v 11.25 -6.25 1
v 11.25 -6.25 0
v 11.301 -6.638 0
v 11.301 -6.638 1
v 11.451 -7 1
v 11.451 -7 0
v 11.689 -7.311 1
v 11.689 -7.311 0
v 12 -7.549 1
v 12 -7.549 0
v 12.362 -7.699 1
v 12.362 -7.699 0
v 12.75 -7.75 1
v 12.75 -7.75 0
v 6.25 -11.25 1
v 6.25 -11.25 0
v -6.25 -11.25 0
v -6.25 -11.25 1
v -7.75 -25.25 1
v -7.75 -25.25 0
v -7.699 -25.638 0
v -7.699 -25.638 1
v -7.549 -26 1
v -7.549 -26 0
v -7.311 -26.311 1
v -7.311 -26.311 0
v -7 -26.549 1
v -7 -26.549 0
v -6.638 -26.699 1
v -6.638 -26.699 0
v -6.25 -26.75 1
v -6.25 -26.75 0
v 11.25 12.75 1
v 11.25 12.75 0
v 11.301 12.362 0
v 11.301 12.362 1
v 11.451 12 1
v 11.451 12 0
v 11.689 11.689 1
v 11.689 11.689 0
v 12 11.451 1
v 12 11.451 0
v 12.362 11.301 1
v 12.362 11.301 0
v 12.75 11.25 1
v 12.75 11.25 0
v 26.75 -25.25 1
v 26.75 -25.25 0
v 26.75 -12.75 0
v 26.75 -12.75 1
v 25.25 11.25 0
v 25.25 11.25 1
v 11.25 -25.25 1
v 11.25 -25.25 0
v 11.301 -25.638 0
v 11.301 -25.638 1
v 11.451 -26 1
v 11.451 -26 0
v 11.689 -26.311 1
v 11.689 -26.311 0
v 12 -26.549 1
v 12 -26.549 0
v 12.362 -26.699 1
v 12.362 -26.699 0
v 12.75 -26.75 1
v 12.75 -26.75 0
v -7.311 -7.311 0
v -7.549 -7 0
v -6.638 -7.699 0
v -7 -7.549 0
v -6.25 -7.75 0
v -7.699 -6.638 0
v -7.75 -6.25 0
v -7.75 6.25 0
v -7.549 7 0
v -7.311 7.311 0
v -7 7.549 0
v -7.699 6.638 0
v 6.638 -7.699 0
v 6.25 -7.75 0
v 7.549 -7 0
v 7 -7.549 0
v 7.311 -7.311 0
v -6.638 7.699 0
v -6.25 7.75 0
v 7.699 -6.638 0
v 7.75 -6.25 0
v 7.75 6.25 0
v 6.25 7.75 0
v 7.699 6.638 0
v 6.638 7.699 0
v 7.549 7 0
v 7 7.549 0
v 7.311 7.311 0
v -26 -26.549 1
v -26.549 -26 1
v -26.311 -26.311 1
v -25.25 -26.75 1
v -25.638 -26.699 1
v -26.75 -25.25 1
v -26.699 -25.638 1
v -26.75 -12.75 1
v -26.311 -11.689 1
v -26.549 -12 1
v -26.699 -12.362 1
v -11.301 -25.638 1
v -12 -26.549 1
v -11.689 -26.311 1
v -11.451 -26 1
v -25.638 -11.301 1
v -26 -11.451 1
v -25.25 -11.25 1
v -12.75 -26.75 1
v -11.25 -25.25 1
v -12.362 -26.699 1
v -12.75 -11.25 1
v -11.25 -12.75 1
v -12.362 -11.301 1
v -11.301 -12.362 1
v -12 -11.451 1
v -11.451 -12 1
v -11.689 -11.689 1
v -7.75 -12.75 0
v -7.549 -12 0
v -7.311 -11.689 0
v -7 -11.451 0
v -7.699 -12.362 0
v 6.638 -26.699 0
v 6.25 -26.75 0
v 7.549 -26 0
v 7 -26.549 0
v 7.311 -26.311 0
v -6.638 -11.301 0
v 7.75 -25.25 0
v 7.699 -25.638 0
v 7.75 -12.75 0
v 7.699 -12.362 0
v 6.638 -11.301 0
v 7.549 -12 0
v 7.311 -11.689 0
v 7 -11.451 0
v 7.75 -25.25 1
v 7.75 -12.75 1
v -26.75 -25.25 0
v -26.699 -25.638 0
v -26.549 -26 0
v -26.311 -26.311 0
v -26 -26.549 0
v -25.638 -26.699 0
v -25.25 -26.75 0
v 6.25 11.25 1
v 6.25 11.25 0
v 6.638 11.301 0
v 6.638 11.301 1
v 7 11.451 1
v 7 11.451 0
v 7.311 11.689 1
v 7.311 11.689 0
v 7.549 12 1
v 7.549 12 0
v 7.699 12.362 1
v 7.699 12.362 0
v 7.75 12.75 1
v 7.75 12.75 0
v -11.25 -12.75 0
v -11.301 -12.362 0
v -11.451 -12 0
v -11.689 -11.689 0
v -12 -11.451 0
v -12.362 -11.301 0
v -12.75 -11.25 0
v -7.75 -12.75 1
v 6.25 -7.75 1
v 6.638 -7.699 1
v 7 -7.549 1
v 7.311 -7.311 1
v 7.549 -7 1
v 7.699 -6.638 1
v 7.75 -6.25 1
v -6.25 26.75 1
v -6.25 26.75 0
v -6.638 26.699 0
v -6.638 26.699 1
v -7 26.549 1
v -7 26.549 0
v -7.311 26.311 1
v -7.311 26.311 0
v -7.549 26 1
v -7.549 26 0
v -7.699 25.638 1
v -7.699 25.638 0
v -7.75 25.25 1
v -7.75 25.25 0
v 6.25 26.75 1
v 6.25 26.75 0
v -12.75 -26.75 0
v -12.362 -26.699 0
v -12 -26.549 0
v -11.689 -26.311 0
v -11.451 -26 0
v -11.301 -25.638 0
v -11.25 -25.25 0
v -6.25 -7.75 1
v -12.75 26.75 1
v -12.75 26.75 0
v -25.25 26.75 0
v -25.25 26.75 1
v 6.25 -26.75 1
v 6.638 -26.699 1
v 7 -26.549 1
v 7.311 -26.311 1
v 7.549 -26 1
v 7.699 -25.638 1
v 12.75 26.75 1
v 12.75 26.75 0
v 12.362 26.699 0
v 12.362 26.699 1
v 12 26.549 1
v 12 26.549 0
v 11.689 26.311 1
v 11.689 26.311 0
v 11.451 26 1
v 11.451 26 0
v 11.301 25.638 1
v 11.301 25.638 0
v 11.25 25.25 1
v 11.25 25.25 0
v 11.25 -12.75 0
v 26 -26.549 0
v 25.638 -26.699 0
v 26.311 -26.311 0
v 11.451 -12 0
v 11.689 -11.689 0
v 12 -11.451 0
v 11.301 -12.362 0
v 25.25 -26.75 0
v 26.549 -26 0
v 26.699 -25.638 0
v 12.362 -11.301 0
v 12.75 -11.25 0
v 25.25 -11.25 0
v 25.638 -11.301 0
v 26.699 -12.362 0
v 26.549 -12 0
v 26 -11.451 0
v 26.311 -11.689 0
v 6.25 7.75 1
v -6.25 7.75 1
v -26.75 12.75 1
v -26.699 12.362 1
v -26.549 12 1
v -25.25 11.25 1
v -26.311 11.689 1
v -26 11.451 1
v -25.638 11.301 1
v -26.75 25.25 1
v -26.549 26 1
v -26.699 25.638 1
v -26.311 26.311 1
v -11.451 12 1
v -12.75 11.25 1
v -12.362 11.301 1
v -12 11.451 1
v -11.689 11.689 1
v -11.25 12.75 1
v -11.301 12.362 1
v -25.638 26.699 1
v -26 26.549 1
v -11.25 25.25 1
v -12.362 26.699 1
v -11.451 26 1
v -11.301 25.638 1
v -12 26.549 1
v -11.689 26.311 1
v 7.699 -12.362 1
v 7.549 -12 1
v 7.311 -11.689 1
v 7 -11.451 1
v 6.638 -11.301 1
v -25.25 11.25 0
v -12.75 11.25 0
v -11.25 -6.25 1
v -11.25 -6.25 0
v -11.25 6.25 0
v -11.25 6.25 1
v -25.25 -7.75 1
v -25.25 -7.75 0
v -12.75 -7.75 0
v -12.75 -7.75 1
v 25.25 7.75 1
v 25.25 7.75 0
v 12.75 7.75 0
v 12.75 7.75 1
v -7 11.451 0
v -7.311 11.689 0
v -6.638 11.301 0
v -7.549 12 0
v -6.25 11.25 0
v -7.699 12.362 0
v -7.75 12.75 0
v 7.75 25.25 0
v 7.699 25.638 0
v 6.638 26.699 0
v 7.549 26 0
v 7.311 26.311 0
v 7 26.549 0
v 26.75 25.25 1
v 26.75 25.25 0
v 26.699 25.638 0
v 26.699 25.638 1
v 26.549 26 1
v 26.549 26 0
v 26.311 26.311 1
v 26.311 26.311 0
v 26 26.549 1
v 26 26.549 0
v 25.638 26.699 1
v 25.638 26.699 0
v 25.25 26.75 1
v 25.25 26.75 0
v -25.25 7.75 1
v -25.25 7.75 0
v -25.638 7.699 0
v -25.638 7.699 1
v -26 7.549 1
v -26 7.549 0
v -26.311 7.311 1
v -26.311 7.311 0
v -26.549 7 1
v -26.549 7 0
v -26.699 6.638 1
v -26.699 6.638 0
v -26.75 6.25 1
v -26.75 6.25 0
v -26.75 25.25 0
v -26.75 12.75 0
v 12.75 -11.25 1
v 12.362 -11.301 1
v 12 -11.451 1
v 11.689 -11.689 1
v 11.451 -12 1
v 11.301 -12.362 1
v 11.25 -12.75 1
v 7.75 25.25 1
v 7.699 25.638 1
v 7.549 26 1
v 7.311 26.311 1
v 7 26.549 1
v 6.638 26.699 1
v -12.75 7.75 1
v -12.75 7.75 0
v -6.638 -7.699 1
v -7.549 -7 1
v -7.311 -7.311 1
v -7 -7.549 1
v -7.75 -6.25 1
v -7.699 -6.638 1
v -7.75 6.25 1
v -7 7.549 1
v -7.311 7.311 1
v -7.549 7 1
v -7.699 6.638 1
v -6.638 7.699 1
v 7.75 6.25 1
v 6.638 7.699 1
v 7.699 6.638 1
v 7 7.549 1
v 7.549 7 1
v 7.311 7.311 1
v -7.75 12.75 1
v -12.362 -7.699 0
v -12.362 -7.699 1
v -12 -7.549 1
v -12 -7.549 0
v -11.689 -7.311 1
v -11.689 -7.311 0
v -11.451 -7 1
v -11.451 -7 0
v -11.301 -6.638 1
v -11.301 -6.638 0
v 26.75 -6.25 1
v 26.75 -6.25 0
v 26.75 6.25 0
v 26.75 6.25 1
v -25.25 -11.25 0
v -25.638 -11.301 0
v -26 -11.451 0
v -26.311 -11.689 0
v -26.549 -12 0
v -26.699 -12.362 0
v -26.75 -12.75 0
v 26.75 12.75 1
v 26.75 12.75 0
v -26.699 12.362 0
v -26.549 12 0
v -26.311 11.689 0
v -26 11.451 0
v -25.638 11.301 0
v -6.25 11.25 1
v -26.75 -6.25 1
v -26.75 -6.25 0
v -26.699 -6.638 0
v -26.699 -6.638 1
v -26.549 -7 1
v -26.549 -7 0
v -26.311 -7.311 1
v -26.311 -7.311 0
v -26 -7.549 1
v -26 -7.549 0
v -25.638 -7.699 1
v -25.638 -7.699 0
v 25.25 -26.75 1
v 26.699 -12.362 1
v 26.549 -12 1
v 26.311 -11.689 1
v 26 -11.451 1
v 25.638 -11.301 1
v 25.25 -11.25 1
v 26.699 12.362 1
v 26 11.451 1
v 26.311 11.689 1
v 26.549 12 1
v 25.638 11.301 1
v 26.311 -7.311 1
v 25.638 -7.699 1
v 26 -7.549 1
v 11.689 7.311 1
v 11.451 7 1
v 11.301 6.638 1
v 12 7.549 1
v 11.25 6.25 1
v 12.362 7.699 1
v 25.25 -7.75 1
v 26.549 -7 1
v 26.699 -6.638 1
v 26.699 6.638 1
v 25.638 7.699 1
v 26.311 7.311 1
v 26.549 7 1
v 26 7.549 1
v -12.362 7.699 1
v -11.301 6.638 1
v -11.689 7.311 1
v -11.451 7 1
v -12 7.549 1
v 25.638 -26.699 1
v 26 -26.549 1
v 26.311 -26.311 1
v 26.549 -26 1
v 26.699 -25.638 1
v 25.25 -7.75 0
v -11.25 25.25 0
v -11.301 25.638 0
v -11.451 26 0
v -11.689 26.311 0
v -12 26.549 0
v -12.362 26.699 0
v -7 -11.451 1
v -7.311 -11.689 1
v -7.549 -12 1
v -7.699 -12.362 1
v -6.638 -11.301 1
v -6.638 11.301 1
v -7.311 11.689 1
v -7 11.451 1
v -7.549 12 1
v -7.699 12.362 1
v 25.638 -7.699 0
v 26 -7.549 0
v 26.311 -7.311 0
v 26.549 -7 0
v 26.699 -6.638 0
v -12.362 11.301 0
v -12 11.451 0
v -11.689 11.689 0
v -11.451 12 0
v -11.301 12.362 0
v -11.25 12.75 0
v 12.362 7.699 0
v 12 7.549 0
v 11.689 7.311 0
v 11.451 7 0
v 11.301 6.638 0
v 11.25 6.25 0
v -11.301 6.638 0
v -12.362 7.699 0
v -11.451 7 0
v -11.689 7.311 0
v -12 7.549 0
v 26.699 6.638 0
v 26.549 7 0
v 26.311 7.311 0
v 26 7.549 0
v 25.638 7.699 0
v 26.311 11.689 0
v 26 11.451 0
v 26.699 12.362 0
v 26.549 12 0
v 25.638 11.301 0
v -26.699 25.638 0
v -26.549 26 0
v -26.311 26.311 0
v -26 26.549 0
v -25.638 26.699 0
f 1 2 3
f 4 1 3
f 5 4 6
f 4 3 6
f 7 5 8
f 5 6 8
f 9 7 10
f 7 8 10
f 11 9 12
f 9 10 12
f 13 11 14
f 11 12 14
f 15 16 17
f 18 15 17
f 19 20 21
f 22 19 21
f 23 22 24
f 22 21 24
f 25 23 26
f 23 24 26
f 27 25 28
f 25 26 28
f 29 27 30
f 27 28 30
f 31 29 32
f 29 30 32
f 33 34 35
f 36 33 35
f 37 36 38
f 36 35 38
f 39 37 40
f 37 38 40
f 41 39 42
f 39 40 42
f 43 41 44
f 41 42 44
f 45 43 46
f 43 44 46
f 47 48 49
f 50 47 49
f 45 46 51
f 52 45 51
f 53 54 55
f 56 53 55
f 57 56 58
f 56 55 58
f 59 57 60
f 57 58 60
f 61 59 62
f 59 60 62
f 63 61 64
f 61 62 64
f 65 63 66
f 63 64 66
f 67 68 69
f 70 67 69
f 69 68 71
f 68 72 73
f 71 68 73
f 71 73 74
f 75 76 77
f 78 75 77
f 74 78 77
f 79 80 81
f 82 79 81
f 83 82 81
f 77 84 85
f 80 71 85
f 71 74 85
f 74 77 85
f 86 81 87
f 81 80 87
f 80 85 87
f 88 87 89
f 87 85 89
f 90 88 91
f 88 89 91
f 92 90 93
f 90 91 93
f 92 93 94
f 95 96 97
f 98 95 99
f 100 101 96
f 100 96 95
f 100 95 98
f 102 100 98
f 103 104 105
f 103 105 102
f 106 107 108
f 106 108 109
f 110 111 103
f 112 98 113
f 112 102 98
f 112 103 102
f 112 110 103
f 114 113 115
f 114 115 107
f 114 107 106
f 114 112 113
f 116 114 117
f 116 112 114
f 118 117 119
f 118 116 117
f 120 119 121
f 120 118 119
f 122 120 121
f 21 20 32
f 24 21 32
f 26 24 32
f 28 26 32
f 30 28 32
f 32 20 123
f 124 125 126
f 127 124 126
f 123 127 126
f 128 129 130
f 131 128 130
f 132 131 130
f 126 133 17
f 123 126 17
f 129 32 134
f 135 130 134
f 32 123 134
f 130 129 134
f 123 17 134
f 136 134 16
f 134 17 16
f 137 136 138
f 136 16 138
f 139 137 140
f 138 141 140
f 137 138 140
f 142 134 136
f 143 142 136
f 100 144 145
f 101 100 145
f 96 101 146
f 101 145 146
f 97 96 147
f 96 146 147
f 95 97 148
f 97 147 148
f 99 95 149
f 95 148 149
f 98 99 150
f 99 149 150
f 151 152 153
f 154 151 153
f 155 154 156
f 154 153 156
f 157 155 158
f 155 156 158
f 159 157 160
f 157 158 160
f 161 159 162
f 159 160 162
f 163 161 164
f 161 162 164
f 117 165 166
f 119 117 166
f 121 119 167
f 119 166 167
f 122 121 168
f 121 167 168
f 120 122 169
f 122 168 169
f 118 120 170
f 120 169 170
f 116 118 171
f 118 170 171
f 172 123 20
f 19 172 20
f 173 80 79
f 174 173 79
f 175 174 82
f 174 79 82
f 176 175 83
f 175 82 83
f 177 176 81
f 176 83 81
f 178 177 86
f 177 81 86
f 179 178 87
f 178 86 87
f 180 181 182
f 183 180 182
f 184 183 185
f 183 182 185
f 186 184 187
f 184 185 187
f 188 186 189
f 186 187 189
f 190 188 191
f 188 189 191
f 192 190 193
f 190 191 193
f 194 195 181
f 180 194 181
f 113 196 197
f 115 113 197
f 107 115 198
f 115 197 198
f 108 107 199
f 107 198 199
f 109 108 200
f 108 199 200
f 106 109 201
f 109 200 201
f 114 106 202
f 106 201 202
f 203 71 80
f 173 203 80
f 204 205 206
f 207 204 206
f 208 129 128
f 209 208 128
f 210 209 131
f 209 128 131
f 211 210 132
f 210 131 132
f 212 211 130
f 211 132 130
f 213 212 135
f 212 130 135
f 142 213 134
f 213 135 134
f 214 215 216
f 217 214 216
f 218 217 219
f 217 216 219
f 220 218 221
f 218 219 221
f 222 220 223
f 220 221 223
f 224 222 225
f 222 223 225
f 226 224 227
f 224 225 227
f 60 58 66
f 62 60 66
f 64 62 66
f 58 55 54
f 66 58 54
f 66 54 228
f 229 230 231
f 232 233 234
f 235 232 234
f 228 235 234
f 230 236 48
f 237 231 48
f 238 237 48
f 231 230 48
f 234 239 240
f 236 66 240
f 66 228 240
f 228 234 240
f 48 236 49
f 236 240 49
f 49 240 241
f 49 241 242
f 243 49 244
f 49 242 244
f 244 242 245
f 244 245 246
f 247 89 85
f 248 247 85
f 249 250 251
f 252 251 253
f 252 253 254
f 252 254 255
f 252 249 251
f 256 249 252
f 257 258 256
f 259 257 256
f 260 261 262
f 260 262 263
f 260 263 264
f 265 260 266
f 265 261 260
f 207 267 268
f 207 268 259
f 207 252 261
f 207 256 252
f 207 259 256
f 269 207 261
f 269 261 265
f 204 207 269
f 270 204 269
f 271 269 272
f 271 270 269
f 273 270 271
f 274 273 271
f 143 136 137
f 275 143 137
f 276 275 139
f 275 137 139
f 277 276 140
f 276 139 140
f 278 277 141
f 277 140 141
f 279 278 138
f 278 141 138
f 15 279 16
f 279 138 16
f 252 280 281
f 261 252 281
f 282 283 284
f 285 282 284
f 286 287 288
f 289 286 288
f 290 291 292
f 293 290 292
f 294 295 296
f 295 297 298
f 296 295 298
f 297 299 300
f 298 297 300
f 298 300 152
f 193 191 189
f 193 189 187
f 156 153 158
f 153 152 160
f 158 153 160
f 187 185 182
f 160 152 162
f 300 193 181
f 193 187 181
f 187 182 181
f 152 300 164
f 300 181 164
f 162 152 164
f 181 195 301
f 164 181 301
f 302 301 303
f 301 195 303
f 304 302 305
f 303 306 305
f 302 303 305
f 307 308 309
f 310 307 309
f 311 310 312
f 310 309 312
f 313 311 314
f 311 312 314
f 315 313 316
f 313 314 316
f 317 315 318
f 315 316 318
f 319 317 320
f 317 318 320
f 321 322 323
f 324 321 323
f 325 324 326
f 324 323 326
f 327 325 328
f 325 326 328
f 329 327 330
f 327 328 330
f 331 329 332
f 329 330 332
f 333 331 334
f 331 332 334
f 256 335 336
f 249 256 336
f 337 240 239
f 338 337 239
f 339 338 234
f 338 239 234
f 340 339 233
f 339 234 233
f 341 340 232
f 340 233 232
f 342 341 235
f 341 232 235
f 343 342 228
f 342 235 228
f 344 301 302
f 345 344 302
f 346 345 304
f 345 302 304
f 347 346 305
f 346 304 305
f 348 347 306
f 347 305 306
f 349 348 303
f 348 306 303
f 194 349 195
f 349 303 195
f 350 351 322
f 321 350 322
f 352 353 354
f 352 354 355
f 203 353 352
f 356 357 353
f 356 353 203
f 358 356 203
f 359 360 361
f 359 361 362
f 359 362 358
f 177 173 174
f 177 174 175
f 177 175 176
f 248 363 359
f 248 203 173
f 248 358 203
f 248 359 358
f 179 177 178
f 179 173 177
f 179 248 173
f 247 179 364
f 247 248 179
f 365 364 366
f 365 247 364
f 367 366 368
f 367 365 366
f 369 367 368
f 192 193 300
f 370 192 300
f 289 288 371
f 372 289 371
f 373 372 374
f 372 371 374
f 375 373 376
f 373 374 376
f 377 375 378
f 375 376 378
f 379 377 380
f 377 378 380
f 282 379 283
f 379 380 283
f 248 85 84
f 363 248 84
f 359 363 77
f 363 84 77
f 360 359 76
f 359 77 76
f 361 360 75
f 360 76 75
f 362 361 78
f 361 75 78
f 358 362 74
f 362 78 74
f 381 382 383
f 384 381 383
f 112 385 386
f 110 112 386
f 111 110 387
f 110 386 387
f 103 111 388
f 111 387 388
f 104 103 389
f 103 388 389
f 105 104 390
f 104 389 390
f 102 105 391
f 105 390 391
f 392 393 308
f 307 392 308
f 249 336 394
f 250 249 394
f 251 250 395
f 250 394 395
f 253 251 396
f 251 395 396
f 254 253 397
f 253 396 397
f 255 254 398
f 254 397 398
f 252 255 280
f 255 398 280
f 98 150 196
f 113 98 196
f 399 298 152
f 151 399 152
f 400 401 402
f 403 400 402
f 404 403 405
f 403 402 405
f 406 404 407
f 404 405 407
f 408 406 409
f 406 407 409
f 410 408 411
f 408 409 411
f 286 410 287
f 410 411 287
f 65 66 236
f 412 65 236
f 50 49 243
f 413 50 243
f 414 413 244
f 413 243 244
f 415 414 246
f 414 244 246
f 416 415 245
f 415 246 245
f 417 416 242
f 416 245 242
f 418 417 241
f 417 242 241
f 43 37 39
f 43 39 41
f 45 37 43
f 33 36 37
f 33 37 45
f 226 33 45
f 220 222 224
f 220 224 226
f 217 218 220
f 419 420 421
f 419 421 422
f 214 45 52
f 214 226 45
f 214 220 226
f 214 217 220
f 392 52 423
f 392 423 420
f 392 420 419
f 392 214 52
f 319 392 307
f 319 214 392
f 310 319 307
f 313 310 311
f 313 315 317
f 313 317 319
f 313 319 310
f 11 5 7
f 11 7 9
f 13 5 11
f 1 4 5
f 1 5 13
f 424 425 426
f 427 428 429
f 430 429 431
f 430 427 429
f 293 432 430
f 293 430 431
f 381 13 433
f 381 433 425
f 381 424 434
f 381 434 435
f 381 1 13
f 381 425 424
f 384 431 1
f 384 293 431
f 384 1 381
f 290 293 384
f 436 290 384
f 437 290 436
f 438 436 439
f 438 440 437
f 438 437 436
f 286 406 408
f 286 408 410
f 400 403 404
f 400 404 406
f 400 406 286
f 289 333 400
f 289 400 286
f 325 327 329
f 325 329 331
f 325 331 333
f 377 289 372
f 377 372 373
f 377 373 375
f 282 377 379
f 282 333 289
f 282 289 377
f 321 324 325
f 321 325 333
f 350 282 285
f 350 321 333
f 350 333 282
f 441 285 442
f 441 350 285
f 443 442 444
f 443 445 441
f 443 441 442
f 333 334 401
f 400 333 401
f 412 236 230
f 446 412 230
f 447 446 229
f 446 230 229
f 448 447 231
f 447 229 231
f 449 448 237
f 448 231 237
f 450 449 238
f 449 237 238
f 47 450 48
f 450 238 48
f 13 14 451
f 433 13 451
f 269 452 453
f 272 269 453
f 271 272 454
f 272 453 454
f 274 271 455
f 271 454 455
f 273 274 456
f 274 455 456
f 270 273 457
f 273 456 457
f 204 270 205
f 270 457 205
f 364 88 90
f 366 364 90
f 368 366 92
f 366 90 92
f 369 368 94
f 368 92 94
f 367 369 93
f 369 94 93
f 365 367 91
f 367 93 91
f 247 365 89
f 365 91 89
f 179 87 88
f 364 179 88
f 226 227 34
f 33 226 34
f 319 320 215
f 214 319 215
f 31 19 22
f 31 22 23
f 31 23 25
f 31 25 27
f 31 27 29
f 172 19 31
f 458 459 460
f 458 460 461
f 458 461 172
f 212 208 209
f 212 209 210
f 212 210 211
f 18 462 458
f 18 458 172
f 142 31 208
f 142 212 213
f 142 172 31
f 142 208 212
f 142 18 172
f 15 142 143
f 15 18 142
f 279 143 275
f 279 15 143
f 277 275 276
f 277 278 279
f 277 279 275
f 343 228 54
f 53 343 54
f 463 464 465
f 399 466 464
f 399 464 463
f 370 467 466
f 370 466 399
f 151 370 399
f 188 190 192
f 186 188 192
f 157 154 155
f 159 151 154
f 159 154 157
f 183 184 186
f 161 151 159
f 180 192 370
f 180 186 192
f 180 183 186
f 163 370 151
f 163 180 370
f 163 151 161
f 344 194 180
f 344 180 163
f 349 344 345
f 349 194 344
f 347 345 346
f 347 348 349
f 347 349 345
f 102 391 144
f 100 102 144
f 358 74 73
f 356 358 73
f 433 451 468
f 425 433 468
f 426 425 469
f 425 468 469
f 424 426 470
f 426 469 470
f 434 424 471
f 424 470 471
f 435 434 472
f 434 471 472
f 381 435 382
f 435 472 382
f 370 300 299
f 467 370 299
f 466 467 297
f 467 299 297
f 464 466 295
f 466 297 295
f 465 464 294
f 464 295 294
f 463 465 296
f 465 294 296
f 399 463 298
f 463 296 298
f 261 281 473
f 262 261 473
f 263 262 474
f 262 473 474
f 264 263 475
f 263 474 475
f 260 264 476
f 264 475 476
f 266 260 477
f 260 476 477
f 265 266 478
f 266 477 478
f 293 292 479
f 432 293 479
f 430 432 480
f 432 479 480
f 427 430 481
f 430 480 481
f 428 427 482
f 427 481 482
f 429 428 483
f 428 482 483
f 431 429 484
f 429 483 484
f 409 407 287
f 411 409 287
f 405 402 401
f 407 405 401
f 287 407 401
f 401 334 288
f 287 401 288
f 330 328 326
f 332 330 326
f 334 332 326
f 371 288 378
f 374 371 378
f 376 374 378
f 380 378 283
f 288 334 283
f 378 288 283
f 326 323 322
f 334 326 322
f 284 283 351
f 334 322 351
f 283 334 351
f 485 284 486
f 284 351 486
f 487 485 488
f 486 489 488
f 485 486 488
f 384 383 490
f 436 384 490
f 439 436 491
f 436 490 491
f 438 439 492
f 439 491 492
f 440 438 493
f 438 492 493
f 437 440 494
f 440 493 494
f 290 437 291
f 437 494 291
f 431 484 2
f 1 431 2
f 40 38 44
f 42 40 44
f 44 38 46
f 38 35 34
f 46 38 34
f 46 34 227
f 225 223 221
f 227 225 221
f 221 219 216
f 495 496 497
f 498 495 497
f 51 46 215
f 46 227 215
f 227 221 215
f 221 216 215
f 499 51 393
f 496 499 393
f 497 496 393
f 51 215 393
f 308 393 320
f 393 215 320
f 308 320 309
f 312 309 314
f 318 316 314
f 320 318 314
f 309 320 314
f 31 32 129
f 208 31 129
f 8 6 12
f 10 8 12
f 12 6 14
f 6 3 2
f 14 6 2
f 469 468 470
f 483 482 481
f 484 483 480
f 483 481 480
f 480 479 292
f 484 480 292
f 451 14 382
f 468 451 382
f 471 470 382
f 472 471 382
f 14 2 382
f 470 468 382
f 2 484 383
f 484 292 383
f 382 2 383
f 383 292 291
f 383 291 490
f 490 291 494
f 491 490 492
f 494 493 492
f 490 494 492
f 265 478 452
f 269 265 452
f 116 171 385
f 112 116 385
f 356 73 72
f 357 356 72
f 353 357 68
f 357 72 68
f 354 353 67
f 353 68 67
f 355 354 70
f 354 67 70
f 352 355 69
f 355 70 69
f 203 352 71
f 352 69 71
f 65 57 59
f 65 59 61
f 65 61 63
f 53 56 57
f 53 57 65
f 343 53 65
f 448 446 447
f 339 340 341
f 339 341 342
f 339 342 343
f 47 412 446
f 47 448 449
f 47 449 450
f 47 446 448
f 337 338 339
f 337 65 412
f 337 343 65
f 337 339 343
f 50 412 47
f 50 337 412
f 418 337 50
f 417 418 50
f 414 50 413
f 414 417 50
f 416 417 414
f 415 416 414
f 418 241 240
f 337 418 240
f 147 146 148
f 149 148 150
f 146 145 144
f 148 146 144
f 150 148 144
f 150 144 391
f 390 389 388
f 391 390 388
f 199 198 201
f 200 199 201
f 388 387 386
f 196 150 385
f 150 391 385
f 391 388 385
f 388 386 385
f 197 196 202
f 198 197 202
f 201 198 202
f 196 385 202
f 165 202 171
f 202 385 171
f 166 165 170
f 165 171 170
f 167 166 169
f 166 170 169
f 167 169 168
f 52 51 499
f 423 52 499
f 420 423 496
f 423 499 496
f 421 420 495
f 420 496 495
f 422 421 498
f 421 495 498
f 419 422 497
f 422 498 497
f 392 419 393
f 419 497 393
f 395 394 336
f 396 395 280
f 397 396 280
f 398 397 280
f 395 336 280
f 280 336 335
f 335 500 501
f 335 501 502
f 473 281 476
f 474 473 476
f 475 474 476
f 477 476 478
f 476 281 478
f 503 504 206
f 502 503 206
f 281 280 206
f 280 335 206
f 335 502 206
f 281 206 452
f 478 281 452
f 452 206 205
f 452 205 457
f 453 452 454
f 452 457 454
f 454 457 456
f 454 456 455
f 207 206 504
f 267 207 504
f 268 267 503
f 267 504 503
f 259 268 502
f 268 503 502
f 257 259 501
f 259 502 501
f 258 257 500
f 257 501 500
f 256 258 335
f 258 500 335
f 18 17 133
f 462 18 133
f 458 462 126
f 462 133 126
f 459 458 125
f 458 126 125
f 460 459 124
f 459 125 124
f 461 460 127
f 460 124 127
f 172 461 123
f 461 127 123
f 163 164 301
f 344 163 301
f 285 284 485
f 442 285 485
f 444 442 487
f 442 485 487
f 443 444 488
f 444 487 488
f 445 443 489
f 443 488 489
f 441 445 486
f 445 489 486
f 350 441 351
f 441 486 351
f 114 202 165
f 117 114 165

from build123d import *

# Parameters (mm, degrees)
F1_DEPTH = 1


with BuildPart() as f1:
    # F0 (on Top) → F1 (new body)
    with BuildSketch(Plane.XY):
        with BuildLine():
            Line((-12.75, -11.25), (-25.25, -11.25))
            ThreePointArc((-25.25, -11.25), (-26.31066, -11.68934), (-26.75, -12.75))
            Line((-26.75, -12.75), (-26.75, -25.25))
            ThreePointArc((-26.75, -25.25), (-26.31066, -26.31066), (-25.25, -26.75))
            Line((-25.25, -26.75), (-12.75, -26.75))
            ThreePointArc((-12.75, -26.75), (-11.68934, -26.31066), (-11.25, -25.25))
            Line((-11.25, -25.25), (-11.25, -12.75))
            ThreePointArc((-11.25, -12.75), (-11.68934, -11.68934), (-12.75, -11.25))
        make_face()
        with BuildLine():
            Line((6.25, -11.25), (-6.25, -11.25))
            ThreePointArc((-6.25, -11.25), (-7.31066, -11.68934), (-7.75, -12.75))
            Line((-7.75, -12.75), (-7.75, -25.25))
            ThreePointArc((-7.75, -25.25), (-7.31066, -26.31066), (-6.25, -26.75))
            Line((-6.25, -26.75), (6.25, -26.75))
            ThreePointArc((6.25, -26.75), (7.31066, -26.31066), (7.75, -25.25))
            Line((7.75, -25.25), (7.75, -12.75))
            ThreePointArc((7.75, -12.75), (7.31066, -11.68934), (6.25, -11.25))
        make_face()
        with BuildLine():
            Line((6.25, 7.75), (-6.25, 7.75))
            ThreePointArc((-6.25, 7.75), (-7.31066, 7.31066), (-7.75, 6.25))
            Line((-7.75, 6.25), (-7.75, -6.25))
            ThreePointArc((-7.75, -6.25), (-7.31066, -7.31066), (-6.25, -7.75))
            Line((-6.25, -7.75), (6.25, -7.75))
            ThreePointArc((6.25, -7.75), (7.31066, -7.31066), (7.75, -6.25))
            Line((7.75, -6.25), (7.75, 6.25))
            ThreePointArc((7.75, 6.25), (7.31066, 7.31066), (6.25, 7.75))
        make_face()
        with BuildLine():
            ThreePointArc((25.25, -26.75), (26.31066, -26.31066), (26.75, -25.25))
            Line((26.75, -25.25), (26.75, -12.75))
            ThreePointArc((26.75, -12.75), (26.31066, -11.68934), (25.25, -11.25))
            Line((25.25, -11.25), (12.75, -11.25))
            ThreePointArc((12.75, -11.25), (11.68934, -11.68934), (11.25, -12.75))
            Line((11.25, -12.75), (11.25, -25.25))
            ThreePointArc((11.25, -25.25), (11.68934, -26.31066), (12.75, -26.75))
            Line((12.75, -26.75), (25.25, -26.75))
        make_face()
        with BuildLine():
            Line((25.25, 7.75), (12.75, 7.75))
            ThreePointArc((12.75, 7.75), (11.68934, 7.31066), (11.25, 6.25))
            Line((11.25, 6.25), (11.25, -6.25))
            ThreePointArc((11.25, -6.25), (11.68934, -7.31066), (12.75, -7.75))
            Line((12.75, -7.75), (25.25, -7.75))
            ThreePointArc((25.25, -7.75), (26.31066, -7.31066), (26.75, -6.25))
            Line((26.75, -6.25), (26.75, 6.25))
            ThreePointArc((26.75, 6.25), (26.31066, 7.31066), (25.25, 7.75))
        make_face()
        with BuildLine():
            ThreePointArc((26.75, 25.25), (26.31066, 26.31066), (25.25, 26.75))
            Line((25.25, 26.75), (12.75, 26.75))
            ThreePointArc((12.75, 26.75), (11.68934, 26.31066), (11.25, 25.25))
            Line((11.25, 25.25), (11.25, 12.75))
            ThreePointArc((11.25, 12.75), (11.68934, 11.68934), (12.75, 11.25))
            Line((12.75, 11.25), (25.25, 11.25))
            ThreePointArc((25.25, 11.25), (26.31066, 11.68934), (26.75, 12.75))
            Line((26.75, 12.75), (26.75, 25.25))
        make_face()
        with BuildLine():
            Line((-7.75, 25.25), (-7.75, 12.75))
            ThreePointArc((-7.75, 12.75), (-7.31066, 11.68934), (-6.25, 11.25))
            Line((-6.25, 11.25), (6.25, 11.25))
            ThreePointArc((6.25, 11.25), (7.31066, 11.68934), (7.75, 12.75))
            Line((7.75, 12.75), (7.75, 25.25))
            ThreePointArc((7.75, 25.25), (7.31066, 26.31066), (6.25, 26.75))
            Line((6.25, 26.75), (-6.25, 26.75))
            ThreePointArc((-6.25, 26.75), (-7.31066, 26.31066), (-7.75, 25.25))
        make_face()
        with BuildLine():
            ThreePointArc((-25.25, 26.75), (-26.31066, 26.31066), (-26.75, 25.25))
            Line((-26.75, 25.25), (-26.75, 12.75))
            ThreePointArc((-26.75, 12.75), (-26.31066, 11.68934), (-25.25, 11.25))
            Line((-25.25, 11.25), (-12.75, 11.25))
            ThreePointArc((-12.75, 11.25), (-11.68934, 11.68934), (-11.25, 12.75))
            Line((-11.25, 12.75), (-11.25, 25.25))
            ThreePointArc((-11.25, 25.25), (-11.68934, 26.31066), (-12.75, 26.75))
            Line((-12.75, 26.75), (-25.25, 26.75))
        make_face()
        with BuildLine():
            Line((-25.25, -7.75), (-12.75, -7.75))
            ThreePointArc((-12.75, -7.75), (-11.68934, -7.31066), (-11.25, -6.25))
            Line((-11.25, -6.25), (-11.25, 6.25))
            ThreePointArc((-11.25, 6.25), (-11.68934, 7.31066), (-12.75, 7.75))
            Line((-12.75, 7.75), (-25.25, 7.75))
            ThreePointArc((-25.25, 7.75), (-26.31066, 7.31066), (-26.75, 6.25))
            Line((-26.75, 6.25), (-26.75, -6.25))
            ThreePointArc((-26.75, -6.25), (-26.31066, -7.31066), (-25.25, -7.75))
        make_face()
    extrude(amount=F1_DEPTH)


solid = f1.part
